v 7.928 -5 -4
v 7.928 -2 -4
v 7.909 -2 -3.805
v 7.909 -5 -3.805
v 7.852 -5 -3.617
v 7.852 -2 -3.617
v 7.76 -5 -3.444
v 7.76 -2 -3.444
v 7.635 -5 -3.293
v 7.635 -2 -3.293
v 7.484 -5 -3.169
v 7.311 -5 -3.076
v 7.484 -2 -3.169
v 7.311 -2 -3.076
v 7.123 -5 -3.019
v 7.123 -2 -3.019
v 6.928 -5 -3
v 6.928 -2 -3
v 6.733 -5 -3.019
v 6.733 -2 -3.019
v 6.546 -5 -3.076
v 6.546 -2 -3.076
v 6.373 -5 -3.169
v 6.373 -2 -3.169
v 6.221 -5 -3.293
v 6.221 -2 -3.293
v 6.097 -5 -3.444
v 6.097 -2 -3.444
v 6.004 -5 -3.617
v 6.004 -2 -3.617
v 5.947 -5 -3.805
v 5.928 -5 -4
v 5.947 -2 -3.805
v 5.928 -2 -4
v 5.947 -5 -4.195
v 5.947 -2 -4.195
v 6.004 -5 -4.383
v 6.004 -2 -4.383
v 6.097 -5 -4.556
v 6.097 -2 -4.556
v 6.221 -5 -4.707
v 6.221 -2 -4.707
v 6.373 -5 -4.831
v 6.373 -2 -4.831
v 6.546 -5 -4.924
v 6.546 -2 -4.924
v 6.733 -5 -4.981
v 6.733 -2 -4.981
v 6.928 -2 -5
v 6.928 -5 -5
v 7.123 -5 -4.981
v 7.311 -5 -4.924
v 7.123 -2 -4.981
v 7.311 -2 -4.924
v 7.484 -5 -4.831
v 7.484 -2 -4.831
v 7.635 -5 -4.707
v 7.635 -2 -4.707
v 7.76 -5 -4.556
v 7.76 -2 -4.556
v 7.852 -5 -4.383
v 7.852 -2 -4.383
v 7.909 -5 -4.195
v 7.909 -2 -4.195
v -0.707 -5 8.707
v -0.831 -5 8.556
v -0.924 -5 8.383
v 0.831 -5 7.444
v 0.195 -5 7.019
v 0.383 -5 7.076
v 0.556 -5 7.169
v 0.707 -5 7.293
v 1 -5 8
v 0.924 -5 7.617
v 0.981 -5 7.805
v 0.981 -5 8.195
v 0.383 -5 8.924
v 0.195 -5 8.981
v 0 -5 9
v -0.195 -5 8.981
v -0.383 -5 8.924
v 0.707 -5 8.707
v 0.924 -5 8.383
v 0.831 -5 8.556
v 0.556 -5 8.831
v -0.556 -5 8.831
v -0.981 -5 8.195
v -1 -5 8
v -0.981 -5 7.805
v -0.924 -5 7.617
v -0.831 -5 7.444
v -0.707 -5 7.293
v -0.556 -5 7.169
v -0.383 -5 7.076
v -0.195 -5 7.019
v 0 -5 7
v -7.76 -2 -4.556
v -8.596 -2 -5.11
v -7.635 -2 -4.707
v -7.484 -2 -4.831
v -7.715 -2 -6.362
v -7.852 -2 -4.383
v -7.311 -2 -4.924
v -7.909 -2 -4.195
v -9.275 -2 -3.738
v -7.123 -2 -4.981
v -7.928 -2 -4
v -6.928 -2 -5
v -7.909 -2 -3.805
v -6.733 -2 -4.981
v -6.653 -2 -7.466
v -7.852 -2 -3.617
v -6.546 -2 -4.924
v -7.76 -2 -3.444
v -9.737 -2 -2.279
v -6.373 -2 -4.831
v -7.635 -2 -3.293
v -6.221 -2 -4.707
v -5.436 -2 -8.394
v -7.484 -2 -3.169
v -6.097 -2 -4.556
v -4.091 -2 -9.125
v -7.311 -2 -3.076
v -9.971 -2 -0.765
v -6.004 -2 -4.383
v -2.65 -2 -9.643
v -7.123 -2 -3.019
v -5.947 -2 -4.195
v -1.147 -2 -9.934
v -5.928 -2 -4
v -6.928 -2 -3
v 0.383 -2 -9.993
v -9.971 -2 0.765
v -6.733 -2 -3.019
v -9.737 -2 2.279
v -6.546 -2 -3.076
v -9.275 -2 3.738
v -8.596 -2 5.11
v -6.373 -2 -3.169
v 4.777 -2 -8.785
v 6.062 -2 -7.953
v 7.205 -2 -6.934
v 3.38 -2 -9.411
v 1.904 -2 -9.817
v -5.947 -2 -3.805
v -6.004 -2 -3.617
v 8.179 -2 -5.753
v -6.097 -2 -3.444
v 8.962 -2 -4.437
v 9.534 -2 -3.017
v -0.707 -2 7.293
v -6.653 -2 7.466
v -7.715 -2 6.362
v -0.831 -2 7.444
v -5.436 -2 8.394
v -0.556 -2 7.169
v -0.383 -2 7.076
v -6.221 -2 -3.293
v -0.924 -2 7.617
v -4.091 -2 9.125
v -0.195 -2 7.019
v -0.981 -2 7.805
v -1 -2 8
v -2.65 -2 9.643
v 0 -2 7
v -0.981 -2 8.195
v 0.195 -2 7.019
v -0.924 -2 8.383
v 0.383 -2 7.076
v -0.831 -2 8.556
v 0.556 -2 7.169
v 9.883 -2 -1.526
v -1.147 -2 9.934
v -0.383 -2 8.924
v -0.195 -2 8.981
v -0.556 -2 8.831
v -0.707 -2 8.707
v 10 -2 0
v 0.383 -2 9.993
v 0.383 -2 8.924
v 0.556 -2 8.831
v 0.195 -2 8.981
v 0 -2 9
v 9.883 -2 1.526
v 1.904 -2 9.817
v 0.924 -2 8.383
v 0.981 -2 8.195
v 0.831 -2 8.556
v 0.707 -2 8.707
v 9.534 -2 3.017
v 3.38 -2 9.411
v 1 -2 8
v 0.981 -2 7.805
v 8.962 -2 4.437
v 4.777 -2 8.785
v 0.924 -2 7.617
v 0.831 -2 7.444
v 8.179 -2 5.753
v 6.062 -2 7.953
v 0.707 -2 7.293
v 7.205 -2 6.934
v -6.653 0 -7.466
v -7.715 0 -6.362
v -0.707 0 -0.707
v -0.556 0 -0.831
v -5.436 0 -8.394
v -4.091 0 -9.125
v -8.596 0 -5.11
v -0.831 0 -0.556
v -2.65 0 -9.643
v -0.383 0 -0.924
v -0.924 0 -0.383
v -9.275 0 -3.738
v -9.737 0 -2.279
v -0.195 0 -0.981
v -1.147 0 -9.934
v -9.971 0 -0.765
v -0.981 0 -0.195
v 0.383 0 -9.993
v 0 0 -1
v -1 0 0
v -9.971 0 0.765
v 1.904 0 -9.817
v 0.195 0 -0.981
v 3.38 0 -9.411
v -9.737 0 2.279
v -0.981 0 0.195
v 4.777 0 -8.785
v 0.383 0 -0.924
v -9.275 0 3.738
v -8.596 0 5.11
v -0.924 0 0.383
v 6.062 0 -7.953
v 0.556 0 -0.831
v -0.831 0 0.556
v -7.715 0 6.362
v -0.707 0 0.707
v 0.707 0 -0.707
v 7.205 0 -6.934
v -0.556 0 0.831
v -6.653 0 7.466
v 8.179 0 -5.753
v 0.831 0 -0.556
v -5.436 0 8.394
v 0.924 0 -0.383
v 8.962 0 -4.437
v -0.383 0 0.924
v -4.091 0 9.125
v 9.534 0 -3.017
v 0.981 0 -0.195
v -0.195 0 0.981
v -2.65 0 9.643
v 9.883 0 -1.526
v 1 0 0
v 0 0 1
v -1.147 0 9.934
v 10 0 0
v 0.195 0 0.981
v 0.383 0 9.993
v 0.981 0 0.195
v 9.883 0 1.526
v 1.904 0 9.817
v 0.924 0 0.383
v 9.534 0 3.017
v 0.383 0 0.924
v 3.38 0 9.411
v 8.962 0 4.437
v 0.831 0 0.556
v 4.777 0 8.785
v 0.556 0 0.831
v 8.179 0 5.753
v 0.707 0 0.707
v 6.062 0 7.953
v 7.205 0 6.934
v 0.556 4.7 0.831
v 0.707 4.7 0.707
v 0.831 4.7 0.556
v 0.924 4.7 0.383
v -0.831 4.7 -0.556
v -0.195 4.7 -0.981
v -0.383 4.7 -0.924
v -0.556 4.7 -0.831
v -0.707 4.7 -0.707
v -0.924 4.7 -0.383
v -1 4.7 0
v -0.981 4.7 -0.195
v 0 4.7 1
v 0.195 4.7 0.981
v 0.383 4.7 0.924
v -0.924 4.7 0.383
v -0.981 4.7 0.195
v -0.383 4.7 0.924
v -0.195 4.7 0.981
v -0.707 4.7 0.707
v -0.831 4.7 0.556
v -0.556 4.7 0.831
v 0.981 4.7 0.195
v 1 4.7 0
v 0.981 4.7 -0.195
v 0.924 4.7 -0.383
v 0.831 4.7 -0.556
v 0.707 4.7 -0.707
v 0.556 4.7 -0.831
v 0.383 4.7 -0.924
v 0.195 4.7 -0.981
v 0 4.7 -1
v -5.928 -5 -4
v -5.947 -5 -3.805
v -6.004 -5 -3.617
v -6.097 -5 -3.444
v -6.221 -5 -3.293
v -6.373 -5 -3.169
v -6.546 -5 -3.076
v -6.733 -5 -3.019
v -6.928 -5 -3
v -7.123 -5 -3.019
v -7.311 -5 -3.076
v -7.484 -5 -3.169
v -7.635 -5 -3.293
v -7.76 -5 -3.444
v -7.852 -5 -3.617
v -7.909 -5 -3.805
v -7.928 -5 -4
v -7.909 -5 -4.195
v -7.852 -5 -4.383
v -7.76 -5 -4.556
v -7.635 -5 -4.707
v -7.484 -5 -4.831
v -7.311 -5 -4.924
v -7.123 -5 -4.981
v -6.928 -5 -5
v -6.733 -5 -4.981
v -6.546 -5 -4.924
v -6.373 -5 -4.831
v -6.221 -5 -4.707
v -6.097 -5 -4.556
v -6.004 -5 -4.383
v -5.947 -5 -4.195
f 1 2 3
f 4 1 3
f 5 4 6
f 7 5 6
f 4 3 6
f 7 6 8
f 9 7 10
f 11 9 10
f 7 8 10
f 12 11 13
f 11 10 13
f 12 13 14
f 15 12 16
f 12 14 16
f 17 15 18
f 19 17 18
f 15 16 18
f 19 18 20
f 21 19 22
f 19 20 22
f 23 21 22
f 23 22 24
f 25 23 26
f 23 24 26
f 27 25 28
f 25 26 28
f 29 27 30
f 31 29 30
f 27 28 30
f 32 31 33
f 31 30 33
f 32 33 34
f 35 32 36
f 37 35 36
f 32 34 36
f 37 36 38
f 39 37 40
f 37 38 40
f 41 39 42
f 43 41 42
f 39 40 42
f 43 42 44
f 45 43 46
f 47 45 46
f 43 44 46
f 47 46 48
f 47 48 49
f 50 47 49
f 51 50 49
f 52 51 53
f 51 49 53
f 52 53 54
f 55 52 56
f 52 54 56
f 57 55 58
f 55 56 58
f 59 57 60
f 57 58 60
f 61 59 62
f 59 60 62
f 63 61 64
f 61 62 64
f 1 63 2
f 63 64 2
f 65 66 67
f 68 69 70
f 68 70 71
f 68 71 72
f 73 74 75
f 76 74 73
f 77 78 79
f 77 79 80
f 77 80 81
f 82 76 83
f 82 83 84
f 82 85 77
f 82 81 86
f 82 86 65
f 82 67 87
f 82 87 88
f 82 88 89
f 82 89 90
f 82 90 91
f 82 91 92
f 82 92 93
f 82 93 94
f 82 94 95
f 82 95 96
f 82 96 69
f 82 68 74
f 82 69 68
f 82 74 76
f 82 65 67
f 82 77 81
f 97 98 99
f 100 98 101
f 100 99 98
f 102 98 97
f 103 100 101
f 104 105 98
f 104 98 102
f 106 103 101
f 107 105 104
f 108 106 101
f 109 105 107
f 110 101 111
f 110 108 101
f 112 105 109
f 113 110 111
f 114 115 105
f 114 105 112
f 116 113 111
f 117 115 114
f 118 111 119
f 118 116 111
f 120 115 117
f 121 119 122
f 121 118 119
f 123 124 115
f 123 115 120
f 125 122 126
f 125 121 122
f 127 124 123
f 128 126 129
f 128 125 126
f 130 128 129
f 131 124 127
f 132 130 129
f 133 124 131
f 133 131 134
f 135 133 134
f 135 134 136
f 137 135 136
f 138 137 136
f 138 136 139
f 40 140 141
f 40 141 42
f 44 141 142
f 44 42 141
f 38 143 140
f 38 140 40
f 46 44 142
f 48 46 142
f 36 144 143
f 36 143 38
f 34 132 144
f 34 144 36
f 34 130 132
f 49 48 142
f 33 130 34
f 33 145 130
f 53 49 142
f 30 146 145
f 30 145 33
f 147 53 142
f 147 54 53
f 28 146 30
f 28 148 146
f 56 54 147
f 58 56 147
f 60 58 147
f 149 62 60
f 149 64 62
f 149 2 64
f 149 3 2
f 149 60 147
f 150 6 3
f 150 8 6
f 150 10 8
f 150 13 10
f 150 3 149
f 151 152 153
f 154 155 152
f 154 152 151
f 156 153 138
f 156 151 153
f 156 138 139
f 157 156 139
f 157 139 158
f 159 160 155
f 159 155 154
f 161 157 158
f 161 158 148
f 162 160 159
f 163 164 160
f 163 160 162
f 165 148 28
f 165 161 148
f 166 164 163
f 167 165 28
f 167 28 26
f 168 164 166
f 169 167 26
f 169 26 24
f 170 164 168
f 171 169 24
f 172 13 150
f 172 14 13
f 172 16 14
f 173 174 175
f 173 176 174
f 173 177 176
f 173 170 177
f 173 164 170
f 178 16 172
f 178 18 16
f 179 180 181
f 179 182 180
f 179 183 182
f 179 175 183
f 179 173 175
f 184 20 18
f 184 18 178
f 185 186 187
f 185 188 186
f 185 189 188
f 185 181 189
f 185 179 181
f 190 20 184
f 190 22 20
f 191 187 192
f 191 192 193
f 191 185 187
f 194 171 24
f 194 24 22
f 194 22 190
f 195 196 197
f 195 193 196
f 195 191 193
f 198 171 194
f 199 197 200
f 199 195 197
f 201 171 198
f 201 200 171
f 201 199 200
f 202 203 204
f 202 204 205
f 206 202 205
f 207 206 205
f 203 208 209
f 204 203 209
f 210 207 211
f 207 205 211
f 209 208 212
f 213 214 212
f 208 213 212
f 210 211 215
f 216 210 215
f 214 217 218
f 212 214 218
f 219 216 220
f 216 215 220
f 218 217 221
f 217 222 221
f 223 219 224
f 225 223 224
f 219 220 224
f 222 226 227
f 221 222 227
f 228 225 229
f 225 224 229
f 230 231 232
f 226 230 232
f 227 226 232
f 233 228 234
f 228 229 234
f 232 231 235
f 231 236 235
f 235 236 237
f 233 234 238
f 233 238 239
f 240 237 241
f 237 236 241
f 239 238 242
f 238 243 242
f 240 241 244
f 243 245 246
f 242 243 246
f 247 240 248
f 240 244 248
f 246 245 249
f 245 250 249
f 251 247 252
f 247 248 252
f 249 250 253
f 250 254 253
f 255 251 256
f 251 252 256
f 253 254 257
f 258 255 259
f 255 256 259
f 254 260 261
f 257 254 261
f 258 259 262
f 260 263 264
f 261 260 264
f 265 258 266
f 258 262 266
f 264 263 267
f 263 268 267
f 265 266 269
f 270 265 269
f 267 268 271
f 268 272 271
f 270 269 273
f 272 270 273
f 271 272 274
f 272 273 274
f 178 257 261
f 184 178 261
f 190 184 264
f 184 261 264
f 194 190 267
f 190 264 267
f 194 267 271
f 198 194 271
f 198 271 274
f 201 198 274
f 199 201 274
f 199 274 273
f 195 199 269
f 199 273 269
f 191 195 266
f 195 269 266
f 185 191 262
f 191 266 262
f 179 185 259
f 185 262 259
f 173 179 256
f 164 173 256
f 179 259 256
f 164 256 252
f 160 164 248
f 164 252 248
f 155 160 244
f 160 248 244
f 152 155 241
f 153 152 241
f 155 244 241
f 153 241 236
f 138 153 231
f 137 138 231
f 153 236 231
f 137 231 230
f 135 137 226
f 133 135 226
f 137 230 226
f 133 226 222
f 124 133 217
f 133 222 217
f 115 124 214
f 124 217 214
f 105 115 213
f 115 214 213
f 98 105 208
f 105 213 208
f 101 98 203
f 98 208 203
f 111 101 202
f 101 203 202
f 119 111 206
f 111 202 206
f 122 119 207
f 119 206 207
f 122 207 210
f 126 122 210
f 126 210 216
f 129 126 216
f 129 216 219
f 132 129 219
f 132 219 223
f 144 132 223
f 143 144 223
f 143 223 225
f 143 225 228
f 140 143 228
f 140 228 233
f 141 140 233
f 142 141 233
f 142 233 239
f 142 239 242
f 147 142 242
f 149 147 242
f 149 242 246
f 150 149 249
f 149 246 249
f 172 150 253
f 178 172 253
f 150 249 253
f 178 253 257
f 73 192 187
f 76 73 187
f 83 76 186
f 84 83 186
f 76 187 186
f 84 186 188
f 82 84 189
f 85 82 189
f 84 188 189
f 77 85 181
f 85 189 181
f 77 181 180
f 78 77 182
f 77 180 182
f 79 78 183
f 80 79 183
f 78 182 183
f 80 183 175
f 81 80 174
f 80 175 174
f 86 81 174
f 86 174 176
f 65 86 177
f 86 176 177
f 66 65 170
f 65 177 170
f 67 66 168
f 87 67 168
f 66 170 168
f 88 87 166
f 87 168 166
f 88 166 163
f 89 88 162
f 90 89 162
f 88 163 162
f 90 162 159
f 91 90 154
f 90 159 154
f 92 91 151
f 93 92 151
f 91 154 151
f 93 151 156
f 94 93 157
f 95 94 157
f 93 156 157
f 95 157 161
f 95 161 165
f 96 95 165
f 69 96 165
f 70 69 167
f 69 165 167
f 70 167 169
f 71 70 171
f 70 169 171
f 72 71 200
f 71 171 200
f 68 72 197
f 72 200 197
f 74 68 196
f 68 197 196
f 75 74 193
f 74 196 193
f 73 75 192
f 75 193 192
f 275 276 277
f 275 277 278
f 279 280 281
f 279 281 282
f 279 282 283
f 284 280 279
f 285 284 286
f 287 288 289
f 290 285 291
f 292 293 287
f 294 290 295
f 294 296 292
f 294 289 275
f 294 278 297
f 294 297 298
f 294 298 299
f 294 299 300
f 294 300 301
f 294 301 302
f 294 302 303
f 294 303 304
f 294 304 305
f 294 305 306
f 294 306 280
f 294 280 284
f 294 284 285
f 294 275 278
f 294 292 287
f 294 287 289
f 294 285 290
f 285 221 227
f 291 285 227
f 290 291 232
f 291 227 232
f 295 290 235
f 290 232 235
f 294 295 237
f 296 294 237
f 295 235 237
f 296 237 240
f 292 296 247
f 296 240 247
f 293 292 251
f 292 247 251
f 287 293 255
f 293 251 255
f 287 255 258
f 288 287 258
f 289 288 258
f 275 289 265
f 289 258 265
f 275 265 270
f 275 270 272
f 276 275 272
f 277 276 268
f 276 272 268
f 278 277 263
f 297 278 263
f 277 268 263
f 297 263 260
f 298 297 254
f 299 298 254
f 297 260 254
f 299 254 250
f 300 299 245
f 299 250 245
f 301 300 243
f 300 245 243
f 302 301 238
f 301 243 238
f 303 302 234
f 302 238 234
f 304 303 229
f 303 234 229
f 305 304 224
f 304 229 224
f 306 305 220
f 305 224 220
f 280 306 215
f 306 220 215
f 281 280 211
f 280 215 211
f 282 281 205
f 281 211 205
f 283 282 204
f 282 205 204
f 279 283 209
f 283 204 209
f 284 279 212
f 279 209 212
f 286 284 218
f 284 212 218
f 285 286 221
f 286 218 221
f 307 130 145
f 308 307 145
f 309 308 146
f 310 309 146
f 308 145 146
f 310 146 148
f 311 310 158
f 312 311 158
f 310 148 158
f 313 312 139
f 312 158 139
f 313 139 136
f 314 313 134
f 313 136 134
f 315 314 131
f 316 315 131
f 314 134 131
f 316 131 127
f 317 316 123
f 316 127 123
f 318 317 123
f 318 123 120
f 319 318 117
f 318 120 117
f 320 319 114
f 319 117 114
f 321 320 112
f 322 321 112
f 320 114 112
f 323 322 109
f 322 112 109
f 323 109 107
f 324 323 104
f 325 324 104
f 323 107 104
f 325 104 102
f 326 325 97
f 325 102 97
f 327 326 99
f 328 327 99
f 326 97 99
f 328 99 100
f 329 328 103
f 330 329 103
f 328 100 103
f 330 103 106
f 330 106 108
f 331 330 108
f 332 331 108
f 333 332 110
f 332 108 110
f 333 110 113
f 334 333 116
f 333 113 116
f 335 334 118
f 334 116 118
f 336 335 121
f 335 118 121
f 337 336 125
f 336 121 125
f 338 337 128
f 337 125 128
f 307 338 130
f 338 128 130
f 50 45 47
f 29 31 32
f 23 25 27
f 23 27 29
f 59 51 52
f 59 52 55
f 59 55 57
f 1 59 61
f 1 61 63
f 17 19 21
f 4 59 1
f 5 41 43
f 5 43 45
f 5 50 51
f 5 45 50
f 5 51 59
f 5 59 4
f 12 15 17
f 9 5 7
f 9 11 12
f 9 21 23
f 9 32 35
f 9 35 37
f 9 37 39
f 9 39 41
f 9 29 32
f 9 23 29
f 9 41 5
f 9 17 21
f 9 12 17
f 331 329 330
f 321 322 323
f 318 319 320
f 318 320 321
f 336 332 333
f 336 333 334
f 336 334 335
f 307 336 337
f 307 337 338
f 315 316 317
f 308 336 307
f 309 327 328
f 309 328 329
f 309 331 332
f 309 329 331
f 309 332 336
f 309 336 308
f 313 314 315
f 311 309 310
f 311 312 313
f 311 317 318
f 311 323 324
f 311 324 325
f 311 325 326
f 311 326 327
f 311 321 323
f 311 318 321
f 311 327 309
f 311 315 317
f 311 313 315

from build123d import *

# Parameters (mm, degrees)
F0_R     = 10
F1_DEPTH = 2
F2_R     = 1
F3_DEPTH = 3
F4_R     = 1
F5_DEPTH = 4.7


with BuildPart() as f1:
    # F0 (on Front) → F1 (new body)
    with BuildSketch(Plane.XZ):
        Circle(F0_R)
    extrude(amount=F1_DEPTH)

    # F2 (on face) → F3 (join)
    with BuildSketch(Plane.XZ.offset(2)):
        with Locations((0, 8)):
            Circle(F2_R)
        with Locations((-6.9282032303, -4)):
            Circle(F2_R)
        with Locations((6.9282032303, -4)):
            Circle(F2_R)
    extrude(amount=F3_DEPTH)

    # F4 (on face) → F5 (join)
    with BuildSketch(Plane(origin=(0, 0, 0), x_dir=(-1, 0, 0), z_dir=(0, 1, 0))):
        Circle(F4_R)
    extrude(amount=F5_DEPTH)


solid = f1.part
